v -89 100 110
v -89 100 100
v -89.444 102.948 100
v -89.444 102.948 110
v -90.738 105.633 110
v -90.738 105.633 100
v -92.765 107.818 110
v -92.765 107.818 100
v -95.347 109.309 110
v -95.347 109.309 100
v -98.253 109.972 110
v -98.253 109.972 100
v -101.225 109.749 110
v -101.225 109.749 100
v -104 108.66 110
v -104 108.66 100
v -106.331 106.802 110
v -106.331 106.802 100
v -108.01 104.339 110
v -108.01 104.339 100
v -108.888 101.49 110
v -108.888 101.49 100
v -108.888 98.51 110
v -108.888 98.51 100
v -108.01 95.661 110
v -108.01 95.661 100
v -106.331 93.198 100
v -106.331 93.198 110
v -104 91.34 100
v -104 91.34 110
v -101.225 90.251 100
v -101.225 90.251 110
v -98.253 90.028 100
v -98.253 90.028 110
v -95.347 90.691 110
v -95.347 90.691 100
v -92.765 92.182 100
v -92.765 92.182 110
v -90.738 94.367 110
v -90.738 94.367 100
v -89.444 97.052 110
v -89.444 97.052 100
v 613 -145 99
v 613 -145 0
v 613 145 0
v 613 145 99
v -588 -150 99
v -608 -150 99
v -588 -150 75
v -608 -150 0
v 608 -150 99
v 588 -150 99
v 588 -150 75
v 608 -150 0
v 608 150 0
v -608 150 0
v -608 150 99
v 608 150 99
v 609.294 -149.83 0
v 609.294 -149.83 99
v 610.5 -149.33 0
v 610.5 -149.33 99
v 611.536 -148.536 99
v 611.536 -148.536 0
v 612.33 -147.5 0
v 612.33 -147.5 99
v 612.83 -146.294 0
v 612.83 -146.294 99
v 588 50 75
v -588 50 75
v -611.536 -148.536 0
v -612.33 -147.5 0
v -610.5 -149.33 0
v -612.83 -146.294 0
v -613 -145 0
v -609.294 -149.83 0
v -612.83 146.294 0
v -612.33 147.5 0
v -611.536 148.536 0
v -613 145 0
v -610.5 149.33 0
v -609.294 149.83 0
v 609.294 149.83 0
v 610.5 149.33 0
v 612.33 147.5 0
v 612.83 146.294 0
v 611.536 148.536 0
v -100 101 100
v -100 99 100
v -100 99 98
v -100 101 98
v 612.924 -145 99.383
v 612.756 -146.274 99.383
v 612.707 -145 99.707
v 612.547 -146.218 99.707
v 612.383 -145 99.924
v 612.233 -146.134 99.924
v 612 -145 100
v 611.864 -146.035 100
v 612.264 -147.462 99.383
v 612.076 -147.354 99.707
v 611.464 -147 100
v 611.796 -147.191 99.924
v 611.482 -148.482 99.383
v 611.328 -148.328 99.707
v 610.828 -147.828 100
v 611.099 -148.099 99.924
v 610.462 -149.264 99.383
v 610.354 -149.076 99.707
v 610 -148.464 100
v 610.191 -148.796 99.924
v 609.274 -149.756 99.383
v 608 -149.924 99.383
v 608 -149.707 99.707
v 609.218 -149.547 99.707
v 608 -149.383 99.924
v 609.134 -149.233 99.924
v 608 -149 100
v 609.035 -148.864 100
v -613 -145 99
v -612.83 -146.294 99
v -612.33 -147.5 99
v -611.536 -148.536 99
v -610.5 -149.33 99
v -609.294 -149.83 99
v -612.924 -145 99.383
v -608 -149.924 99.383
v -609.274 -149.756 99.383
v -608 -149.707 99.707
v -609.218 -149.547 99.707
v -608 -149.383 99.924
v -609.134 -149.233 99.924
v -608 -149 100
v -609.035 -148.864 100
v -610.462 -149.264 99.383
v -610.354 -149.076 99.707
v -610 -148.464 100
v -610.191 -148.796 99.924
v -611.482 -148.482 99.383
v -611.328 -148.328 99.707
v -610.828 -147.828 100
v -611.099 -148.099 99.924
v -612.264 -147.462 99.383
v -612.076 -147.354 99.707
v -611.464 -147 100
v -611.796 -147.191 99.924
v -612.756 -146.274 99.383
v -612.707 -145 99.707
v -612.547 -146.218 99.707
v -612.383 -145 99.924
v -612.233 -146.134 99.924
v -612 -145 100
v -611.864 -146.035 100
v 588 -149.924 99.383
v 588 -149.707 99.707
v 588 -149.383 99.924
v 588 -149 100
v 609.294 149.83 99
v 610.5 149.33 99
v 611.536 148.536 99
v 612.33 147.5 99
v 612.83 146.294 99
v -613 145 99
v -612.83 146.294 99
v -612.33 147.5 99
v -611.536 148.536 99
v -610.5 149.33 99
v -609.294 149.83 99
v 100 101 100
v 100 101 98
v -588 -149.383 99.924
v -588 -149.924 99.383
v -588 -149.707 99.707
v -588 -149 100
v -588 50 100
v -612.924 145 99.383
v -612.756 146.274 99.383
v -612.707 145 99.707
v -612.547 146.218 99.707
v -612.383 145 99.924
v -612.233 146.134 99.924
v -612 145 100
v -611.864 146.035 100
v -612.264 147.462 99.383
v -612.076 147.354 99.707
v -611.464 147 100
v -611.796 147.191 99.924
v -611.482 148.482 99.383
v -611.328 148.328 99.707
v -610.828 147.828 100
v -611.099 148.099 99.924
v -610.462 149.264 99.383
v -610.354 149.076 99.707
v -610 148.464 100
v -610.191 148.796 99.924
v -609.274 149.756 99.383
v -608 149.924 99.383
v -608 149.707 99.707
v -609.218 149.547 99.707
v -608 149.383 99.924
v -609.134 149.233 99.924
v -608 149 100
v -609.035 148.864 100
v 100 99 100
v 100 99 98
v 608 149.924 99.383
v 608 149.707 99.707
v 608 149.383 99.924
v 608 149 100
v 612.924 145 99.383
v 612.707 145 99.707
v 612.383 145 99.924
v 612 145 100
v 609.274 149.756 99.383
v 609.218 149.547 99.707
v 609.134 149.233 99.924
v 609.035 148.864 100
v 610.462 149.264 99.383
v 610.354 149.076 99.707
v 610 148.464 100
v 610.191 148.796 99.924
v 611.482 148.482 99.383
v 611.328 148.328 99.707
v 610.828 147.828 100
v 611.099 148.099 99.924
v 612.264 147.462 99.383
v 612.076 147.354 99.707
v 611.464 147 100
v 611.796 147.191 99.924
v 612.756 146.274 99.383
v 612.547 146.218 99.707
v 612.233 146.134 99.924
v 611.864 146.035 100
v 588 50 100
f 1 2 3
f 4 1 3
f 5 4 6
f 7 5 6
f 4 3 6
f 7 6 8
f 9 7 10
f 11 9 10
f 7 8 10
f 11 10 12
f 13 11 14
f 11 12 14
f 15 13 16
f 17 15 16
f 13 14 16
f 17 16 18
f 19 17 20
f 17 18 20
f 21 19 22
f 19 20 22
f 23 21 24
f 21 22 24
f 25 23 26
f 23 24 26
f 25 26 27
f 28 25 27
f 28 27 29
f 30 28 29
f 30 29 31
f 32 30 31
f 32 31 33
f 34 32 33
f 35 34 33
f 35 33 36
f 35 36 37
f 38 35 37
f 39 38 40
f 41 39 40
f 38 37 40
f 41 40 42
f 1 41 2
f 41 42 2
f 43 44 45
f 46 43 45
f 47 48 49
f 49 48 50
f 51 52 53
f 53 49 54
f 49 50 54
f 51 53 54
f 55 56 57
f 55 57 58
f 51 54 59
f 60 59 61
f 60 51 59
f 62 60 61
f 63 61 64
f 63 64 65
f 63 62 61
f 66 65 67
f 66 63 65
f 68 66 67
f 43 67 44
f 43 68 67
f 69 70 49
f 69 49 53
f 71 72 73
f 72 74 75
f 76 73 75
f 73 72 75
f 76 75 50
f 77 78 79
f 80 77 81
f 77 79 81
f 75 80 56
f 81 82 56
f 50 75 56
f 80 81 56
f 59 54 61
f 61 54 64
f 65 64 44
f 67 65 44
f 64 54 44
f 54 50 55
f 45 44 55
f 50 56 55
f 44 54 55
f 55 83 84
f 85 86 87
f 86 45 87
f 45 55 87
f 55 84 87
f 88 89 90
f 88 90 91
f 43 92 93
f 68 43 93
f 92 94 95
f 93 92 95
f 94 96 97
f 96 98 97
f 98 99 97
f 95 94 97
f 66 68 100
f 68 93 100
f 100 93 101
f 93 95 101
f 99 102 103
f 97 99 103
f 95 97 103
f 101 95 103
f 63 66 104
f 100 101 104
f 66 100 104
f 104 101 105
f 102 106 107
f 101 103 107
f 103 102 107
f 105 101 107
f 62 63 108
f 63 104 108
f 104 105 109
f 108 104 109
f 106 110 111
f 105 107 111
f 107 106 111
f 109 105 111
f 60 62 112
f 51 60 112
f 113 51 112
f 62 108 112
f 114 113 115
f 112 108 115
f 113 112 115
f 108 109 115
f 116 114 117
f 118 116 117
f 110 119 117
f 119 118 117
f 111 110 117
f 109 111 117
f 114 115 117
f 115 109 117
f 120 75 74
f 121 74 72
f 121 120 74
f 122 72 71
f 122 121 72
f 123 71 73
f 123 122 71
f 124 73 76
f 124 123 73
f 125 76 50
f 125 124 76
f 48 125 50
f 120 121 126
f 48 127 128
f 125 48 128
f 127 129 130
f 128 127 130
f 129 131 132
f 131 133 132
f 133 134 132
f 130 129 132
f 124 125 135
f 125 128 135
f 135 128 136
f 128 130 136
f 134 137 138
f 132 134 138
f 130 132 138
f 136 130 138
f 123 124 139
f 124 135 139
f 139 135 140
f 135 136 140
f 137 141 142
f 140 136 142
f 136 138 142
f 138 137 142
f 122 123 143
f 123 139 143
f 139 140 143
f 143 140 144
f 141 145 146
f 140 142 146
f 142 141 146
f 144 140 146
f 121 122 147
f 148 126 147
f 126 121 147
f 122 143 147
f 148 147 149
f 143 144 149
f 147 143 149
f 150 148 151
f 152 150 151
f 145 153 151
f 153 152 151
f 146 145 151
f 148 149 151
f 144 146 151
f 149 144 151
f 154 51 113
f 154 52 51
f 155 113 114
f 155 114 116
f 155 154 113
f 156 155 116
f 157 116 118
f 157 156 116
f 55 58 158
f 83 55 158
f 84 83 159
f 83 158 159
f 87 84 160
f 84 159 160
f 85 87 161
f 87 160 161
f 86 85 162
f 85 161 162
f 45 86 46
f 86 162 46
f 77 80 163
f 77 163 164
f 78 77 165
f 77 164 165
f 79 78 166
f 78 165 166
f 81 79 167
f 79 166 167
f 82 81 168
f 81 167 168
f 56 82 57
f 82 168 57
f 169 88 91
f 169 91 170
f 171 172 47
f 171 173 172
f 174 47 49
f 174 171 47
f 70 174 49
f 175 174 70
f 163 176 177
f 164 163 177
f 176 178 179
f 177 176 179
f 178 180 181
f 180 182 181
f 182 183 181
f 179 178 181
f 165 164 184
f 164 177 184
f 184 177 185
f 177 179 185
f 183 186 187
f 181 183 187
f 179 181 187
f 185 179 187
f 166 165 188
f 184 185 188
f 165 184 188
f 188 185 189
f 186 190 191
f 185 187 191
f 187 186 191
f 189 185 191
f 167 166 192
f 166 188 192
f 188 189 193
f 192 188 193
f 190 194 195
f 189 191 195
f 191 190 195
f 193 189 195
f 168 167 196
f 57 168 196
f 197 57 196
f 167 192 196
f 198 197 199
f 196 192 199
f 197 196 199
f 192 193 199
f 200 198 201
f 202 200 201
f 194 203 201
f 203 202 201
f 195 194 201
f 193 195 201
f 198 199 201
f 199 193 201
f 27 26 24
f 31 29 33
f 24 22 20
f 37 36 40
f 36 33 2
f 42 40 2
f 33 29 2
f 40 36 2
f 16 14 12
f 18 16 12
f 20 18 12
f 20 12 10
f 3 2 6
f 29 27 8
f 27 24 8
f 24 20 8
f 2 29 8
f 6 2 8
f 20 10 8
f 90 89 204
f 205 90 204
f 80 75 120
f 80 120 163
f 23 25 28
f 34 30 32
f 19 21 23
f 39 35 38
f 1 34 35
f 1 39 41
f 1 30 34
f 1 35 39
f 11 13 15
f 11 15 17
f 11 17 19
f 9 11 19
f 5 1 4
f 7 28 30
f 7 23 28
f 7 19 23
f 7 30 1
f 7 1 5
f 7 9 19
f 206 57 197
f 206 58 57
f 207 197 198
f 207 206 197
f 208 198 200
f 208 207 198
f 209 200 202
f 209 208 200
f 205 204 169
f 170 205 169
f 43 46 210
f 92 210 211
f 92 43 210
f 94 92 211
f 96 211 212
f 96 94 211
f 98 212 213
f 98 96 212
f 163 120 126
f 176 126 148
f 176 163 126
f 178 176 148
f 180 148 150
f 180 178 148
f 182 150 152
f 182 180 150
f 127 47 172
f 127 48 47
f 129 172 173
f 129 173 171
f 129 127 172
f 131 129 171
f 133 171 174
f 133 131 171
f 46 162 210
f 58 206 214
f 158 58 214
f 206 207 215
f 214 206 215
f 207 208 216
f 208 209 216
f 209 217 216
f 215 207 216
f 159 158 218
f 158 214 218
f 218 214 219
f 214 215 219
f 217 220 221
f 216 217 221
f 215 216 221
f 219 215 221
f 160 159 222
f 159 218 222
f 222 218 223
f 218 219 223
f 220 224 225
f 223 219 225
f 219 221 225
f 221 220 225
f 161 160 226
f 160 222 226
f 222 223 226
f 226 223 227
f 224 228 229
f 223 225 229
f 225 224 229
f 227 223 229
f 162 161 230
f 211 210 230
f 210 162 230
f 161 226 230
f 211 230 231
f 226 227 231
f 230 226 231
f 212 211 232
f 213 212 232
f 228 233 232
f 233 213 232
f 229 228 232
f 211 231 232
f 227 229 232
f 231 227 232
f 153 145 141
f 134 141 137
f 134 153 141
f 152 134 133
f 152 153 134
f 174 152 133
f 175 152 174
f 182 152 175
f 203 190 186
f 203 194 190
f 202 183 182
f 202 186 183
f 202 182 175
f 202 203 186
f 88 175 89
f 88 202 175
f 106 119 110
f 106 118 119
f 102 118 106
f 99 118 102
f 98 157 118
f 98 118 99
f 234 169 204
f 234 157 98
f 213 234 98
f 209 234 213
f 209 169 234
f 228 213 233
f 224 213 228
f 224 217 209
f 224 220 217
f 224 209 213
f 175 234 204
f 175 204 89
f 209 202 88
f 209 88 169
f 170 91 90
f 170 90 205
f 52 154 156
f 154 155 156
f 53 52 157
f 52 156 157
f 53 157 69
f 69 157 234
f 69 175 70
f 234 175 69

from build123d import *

# Parameters (mm, degrees)
F0_W     = 1226
F0_H     = 300
F1_DEPTH = 100
F2_W     = 1176
F2_H     = 200
F3_DEPTH = 25
F4_W     = 200
F4_H     = 2
F5_DEPTH = 2
F6_R     = 10
F7_DEPTH = 10
F8_R     = 5
F9_R     = 1


with BuildPart() as f1:
    # F0 (on Top) → F1 (new body)
    with BuildSketch(Plane.XY):
        Rectangle(F0_W, F0_H)
    extrude(amount=F1_DEPTH)

    # F2 (on face) → F3 (cut)
    with BuildSketch(Plane.XY.offset(100)):
        with Locations((0, -50)):
            Rectangle(F2_W, F2_H)
    extrude(amount=-F3_DEPTH, mode=Mode.SUBTRACT)

    # F4 (on face) → F5 (cut)
    with BuildSketch(Plane.XY.offset(100)):
        with Locations((0, 100)):
            Rectangle(F4_W, F4_H)
    extrude(amount=-F5_DEPTH, mode=Mode.SUBTRACT)

    # F8
    f8_edges = [f1.edges().sort_by_distance(p)[0] for p in [
        (-613, 150, 50),
        (-613, -150, 50),
        (613, -150, 50),
        (613, 150, 50),
    ]]
    fillet(f8_edges, radius=F8_R)

    # F9
    f9_edges = [f1.edges().sort_by_distance(p)[0] for p in [
        (-613, 0, 100),
    ]]
    fillet(f9_edges, radius=F9_R)


with BuildPart() as f7:
    # F6 (on face) → F7 (new body)
    with BuildSketch(Plane.XY.offset(100)):
        with Locations((-99, 100)):
            Circle(F6_R)
    extrude(amount=F7_DEPTH)


solid = Compound([f1.part, f7.part])
